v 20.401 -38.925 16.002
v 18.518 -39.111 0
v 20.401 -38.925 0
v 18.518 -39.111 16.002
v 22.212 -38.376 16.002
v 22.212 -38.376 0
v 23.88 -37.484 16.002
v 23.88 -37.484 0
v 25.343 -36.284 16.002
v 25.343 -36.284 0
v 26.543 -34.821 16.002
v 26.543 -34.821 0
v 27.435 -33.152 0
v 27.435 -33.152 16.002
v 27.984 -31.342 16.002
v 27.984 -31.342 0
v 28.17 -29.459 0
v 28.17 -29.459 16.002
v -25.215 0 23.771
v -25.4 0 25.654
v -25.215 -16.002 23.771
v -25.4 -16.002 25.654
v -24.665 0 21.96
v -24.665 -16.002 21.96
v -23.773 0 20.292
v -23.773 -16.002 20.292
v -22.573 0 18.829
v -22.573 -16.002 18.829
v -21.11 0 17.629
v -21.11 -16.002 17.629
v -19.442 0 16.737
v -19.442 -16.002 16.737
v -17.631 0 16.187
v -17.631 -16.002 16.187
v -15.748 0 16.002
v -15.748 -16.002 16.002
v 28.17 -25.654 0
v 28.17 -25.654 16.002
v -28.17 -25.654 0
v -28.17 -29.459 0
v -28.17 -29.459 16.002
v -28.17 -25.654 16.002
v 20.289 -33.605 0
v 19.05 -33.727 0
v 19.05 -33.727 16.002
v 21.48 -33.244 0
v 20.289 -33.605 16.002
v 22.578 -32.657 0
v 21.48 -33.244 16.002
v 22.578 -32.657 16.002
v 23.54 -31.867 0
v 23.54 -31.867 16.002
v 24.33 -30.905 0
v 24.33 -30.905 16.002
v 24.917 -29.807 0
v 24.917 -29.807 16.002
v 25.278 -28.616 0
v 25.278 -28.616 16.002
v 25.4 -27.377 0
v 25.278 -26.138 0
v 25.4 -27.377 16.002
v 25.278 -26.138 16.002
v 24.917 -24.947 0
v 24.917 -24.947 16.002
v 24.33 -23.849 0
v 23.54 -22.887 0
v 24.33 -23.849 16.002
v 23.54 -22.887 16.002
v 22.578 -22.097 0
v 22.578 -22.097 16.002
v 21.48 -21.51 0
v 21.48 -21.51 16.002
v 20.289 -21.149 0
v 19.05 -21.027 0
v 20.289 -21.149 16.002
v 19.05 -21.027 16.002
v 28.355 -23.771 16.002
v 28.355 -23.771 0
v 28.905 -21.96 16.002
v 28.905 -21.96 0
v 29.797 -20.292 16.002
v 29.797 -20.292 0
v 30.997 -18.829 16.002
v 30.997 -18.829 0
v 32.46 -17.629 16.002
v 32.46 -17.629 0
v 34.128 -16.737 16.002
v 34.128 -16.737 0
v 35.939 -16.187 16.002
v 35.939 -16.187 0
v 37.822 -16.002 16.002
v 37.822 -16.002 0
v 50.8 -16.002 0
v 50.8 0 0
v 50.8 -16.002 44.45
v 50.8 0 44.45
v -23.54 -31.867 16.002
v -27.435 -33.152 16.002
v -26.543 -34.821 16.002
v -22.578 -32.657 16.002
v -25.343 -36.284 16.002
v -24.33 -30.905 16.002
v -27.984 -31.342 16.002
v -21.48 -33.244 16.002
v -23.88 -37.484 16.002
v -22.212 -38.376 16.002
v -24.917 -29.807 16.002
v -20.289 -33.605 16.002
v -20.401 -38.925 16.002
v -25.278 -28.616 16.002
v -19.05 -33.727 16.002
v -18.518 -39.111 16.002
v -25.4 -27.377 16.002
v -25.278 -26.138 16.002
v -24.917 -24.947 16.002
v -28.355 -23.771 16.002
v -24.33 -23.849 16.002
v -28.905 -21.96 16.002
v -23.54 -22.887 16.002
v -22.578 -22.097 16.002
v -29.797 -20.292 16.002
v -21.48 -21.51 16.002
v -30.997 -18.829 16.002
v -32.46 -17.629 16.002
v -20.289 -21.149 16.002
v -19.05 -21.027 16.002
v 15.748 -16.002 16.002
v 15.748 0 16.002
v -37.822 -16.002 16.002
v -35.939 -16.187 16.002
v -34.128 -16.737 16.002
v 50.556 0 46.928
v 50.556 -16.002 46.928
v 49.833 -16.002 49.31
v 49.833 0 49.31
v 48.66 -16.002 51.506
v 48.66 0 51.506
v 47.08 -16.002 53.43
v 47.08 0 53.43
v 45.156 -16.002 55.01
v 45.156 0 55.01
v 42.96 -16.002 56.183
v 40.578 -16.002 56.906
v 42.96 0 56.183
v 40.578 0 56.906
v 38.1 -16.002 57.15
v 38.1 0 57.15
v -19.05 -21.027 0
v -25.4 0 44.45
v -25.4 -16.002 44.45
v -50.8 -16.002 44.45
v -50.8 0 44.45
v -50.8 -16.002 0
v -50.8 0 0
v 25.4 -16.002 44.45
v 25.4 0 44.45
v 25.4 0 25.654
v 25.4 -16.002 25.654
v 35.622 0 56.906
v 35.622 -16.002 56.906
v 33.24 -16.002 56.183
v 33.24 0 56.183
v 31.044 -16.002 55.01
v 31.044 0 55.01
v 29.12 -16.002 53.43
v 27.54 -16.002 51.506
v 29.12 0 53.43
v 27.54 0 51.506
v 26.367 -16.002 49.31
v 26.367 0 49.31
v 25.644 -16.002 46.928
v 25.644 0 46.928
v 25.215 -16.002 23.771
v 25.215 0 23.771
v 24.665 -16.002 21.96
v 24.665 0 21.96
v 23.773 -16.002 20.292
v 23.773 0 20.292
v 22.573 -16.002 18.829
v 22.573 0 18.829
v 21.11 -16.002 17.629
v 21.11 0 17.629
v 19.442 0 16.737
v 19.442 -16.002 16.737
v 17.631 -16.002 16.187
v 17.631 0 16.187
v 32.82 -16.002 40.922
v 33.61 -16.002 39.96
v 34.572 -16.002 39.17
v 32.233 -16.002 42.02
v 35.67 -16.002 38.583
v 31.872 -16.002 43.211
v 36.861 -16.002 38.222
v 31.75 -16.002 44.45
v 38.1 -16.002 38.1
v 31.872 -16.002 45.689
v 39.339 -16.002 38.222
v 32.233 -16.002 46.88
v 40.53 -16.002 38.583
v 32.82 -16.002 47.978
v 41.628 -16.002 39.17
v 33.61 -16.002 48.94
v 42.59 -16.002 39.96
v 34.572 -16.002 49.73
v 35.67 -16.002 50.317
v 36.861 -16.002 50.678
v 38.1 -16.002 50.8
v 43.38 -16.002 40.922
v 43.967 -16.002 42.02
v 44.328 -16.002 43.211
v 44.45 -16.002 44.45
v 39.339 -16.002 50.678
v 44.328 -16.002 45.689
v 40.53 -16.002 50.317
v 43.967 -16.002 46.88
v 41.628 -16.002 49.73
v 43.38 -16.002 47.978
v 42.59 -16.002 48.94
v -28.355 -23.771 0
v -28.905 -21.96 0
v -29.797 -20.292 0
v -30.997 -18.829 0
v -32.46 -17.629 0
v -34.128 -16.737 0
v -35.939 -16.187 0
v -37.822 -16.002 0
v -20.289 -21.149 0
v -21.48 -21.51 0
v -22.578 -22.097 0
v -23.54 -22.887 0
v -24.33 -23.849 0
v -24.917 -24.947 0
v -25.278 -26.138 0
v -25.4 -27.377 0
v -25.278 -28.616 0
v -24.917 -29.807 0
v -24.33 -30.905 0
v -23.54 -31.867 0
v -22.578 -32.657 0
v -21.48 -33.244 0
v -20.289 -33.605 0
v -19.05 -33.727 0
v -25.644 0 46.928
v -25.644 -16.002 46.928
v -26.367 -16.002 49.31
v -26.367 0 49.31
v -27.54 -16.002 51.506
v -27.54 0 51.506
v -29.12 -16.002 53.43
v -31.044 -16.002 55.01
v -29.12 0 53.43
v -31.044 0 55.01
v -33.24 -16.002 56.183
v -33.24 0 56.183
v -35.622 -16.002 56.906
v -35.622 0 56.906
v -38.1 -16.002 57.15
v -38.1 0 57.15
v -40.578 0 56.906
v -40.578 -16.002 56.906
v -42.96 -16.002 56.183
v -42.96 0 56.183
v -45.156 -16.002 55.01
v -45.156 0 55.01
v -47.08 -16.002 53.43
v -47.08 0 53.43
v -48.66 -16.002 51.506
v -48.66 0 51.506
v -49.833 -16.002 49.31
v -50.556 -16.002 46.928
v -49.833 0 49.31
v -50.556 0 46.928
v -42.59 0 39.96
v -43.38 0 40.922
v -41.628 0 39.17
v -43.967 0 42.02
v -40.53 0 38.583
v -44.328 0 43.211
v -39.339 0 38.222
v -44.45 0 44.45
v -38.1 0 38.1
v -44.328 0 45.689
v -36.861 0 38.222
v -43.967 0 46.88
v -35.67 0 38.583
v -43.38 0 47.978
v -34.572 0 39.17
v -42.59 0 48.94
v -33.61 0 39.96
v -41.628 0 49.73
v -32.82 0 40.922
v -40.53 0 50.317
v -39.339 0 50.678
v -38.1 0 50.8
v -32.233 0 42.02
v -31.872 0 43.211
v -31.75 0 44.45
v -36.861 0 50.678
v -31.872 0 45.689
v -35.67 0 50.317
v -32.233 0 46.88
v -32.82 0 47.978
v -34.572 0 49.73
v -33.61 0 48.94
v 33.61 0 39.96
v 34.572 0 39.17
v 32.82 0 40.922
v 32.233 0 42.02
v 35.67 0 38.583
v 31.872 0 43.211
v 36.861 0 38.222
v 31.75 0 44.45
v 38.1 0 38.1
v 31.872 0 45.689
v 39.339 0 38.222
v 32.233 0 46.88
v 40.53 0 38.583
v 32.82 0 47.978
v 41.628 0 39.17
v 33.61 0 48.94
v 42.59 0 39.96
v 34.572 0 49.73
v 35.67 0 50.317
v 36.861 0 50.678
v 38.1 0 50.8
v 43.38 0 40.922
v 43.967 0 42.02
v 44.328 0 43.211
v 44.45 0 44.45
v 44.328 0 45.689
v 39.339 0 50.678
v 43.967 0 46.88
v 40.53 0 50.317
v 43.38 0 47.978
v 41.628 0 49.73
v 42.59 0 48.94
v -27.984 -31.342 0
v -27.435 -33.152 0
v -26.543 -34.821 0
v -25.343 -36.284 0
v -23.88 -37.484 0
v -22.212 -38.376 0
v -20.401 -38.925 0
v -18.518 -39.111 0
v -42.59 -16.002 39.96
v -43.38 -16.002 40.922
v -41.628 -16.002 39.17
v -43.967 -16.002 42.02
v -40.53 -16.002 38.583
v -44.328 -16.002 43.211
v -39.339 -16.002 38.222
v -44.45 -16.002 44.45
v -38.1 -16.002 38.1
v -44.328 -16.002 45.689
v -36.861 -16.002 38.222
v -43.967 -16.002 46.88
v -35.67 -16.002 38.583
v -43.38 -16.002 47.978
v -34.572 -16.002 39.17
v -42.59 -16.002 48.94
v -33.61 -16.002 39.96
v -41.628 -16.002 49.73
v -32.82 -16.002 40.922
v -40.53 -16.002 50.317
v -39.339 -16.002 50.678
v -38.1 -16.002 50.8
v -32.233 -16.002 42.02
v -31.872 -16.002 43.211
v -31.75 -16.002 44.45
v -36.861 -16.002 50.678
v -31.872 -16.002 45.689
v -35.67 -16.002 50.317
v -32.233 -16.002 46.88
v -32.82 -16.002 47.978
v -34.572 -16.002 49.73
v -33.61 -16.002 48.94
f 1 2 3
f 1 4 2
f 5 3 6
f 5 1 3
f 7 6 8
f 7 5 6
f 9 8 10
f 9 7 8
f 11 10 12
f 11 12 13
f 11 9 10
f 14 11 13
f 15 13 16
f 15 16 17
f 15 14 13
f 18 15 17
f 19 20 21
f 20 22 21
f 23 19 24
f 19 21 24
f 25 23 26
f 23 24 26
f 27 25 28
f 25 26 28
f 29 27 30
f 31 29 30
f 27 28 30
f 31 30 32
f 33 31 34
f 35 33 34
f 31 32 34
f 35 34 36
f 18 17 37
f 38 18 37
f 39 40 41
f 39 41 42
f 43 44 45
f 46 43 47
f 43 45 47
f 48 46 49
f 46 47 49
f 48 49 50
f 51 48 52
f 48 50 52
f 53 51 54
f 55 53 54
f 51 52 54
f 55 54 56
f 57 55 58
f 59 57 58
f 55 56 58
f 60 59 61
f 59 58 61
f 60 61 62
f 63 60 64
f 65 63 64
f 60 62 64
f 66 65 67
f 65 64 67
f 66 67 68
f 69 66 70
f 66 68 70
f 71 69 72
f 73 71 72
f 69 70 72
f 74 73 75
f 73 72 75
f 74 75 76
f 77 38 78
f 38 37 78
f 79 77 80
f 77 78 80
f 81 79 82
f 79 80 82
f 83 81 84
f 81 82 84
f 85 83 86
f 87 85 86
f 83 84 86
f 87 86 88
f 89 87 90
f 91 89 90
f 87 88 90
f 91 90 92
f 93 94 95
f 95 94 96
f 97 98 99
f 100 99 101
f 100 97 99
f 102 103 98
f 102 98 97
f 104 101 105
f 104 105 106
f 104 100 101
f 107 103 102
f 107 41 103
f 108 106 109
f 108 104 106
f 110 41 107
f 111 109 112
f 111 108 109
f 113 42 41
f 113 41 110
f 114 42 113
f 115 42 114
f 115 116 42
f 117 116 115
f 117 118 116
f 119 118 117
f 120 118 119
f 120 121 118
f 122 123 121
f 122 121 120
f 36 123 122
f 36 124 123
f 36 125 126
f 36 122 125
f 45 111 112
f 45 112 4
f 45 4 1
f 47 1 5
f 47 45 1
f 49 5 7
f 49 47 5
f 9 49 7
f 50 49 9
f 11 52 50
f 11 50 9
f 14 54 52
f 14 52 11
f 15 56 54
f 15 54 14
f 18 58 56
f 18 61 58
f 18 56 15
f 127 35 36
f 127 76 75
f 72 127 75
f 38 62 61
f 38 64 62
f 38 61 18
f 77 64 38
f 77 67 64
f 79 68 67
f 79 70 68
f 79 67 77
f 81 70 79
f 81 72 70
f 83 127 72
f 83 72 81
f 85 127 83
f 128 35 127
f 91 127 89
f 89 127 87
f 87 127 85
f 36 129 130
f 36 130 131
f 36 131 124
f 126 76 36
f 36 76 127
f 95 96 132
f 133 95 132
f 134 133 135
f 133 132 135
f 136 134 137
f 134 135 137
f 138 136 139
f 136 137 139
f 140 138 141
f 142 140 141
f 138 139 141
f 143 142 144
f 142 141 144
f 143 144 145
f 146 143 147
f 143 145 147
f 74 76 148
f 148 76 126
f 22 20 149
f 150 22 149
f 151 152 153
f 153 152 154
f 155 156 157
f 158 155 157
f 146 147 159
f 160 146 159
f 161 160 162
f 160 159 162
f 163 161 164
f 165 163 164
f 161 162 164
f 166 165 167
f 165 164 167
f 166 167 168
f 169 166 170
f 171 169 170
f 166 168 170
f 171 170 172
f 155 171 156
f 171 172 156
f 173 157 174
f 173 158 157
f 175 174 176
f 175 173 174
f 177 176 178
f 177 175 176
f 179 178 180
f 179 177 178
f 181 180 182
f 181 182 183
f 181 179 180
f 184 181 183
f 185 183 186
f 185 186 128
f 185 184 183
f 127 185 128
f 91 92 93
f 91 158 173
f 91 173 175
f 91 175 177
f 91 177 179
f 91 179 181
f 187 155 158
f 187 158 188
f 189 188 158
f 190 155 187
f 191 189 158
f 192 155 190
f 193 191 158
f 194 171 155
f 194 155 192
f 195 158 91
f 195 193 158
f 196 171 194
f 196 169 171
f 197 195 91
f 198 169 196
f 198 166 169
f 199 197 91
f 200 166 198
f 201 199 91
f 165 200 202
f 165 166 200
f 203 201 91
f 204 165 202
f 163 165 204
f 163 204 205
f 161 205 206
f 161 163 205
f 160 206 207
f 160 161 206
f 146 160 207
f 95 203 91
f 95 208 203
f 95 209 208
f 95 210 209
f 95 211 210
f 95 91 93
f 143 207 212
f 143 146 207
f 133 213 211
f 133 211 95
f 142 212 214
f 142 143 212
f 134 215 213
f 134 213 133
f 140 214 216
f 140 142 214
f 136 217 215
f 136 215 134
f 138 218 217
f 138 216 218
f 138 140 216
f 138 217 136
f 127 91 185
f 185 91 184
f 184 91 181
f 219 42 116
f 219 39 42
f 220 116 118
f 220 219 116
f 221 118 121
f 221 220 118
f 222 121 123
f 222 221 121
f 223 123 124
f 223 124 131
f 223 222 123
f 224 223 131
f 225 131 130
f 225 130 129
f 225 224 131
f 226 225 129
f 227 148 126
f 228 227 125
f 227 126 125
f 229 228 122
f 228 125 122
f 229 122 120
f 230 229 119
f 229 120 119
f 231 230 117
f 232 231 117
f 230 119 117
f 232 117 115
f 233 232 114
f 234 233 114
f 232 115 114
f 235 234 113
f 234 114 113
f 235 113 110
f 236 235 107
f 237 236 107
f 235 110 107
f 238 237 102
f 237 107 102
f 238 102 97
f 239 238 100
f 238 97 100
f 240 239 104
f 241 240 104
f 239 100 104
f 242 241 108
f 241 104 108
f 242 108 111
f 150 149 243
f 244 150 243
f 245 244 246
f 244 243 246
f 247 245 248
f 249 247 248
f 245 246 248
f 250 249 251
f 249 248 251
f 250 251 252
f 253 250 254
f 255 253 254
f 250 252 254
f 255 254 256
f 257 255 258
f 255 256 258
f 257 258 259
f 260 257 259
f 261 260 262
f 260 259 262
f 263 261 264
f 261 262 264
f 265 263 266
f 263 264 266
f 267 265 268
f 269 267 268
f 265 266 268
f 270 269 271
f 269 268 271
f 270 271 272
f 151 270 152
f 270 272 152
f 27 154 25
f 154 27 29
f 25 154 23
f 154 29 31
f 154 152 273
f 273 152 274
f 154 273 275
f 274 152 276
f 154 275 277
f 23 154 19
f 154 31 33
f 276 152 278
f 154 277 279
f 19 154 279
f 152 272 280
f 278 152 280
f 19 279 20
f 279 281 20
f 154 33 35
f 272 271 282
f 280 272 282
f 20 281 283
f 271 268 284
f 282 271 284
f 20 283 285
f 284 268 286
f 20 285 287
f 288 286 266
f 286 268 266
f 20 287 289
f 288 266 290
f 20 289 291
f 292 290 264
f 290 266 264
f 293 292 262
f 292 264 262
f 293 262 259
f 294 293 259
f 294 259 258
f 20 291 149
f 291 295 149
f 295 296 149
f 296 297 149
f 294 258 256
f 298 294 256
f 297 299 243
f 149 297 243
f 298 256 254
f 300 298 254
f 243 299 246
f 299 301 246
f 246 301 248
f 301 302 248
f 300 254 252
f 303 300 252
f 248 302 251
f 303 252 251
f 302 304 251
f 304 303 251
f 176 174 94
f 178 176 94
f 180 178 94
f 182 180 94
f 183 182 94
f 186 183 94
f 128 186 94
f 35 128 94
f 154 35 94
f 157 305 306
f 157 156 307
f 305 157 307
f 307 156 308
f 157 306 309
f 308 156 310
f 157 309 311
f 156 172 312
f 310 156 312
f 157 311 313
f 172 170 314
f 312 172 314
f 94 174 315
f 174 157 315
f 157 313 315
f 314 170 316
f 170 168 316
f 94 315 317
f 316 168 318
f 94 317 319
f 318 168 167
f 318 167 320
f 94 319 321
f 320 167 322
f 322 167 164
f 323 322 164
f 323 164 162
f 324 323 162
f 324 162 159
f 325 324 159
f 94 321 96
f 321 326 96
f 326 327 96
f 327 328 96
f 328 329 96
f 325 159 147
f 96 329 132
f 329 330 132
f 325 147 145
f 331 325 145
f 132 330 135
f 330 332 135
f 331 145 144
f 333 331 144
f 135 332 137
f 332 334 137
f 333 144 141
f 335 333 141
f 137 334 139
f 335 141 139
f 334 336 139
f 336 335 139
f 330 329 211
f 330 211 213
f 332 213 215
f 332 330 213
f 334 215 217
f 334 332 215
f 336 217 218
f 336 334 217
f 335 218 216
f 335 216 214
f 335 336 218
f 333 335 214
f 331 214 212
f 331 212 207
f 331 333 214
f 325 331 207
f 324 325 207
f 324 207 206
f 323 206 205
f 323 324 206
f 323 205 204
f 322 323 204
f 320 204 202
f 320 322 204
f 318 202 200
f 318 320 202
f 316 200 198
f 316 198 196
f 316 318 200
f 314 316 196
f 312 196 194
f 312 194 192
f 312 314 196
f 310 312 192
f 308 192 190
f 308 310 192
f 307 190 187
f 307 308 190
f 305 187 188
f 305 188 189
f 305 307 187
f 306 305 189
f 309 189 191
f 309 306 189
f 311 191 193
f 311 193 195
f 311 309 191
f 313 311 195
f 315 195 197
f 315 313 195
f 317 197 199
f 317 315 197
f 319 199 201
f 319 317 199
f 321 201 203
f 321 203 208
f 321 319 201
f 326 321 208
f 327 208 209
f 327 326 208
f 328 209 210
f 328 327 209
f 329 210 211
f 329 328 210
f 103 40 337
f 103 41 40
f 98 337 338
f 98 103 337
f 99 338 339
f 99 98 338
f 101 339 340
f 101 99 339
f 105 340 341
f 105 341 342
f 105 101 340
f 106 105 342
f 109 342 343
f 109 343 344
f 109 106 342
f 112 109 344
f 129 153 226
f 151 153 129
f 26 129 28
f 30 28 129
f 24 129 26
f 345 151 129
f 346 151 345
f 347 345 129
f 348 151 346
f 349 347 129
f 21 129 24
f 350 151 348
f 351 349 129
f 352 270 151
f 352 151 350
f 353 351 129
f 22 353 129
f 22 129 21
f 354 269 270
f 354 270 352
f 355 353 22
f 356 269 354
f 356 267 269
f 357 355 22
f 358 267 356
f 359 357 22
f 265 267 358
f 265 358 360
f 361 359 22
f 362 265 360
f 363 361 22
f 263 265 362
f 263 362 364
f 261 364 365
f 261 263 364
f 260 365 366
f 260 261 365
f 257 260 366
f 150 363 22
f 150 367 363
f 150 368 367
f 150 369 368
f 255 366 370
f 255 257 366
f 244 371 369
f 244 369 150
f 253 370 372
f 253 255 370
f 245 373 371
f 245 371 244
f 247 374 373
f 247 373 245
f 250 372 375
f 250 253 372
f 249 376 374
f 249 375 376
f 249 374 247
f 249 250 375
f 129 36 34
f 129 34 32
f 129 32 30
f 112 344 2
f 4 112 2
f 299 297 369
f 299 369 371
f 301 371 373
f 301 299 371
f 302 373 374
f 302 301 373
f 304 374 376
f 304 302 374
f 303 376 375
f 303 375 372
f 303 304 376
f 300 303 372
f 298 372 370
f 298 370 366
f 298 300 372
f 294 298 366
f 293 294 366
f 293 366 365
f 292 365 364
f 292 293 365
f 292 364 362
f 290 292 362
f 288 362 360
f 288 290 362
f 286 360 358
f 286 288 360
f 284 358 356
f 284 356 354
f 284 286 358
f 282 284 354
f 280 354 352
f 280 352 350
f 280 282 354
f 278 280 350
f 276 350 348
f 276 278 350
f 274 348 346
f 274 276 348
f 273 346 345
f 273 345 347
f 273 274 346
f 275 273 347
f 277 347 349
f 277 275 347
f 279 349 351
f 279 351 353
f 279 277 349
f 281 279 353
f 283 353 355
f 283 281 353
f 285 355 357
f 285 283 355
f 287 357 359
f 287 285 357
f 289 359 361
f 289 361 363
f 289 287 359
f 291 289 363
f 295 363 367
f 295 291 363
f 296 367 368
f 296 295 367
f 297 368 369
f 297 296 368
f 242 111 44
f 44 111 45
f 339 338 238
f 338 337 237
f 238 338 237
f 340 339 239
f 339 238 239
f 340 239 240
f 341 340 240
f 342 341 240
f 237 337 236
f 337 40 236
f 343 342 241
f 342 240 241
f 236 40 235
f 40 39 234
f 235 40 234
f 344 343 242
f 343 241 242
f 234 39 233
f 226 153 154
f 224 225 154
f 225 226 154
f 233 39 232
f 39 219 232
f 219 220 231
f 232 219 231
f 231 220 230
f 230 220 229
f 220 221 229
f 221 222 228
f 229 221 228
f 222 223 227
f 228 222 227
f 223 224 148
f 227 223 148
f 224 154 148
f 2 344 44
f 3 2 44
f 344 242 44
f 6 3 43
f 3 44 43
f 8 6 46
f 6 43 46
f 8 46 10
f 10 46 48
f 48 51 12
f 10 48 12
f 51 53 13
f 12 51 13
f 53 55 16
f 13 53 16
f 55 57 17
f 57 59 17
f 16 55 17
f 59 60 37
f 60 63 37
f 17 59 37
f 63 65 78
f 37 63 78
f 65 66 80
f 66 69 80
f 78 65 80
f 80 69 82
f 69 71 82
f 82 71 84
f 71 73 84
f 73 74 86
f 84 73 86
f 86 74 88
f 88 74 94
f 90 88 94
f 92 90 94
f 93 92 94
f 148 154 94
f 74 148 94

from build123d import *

# Parameters (mm, degrees)
F0_R     = 6.35
F1_DEPTH = 16.002
F2_DEPTH = 16.002
F3_R     = 9.652
F4_W     = 56.33977
F4_H     = 23.11277
F5_DEPTH = 16.002
F7_R     = 9.652
F8_DEPTH = 16.003


with BuildPart() as f1:
    # F0 (on Front) → F1 (new body)
    with BuildSketch(Plane.XZ):
        with BuildLine():
            Line((-50.8, 0), (0, 0))
            Line((0, 0), (50.8, 0))
            Line((50.8, 0), (50.8, 44.45))
            ThreePointArc((50.8, 44.45), (47.080256, 53.430256), (38.1, 57.15))
            ThreePointArc((38.1, 57.15), (29.119744, 53.430256), (25.4, 44.45))
            Line((25.4, 44.45), (25.4, 16.002))
            Line((25.4, 16.002), (0, 16.002))
            Line((0, 16.002), (-25.4, 16.002))
            Line((-25.4, 16.002), (-25.4, 44.45))
            ThreePointArc((-25.4, 44.45), (-29.119744, 53.430256), (-38.1, 57.15))
            ThreePointArc((-38.1, 57.15), (-47.080256, 53.430256), (-50.8, 44.45))
            Line((-50.8, 44.45), (-50.8, 0))
        make_face()
        with Locations((-38.1, 44.45)):
            Circle(F0_R, mode=Mode.SUBTRACT)
        with Locations((38.1, 44.45)):
            Circle(F0_R, mode=Mode.SUBTRACT)
    extrude(amount=F1_DEPTH)

    # F0 (on Front) → F2 (join)
    with BuildSketch(Plane.XZ):
        with BuildLine():
            Line((-50.8, 0), (0, 0))
            Line((0, 0), (50.8, 0))
            Line((50.8, 0), (50.8, 44.45))
            ThreePointArc((50.8, 44.45), (47.080256, 53.430256), (38.1, 57.15))
            ThreePointArc((38.1, 57.15), (29.119744, 53.430256), (25.4, 44.45))
            Line((25.4, 44.45), (25.4, 16.002))
            Line((25.4, 16.002), (0, 16.002))
            Line((0, 16.002), (-25.4, 16.002))
            Line((-25.4, 16.002), (-25.4, 44.45))
            ThreePointArc((-25.4, 44.45), (-29.119744, 53.430256), (-38.1, 57.15))
            ThreePointArc((-38.1, 57.15), (-47.080256, 53.430256), (-50.8, 44.45))
            Line((-50.8, 44.45), (-50.8, 0))
        make_face()
        with Locations((-38.1, 44.45)):
            Circle(F0_R, mode=Mode.SUBTRACT)
        with Locations((38.1, 44.45)):
            Circle(F0_R, mode=Mode.SUBTRACT)
    extrude(amount=F2_DEPTH)

    # F3
    f3_edges = [f1.edges().sort_by_distance(p)[0] for p in [
        (-25.4, -8.001, 16.002),
        (25.4, -8.001, 16.002),
    ]]
    fillet(f3_edges, radius=F3_R)

    # F4 (on Top) → F5 (join)
    with BuildSketch(Plane.XY):
        with Locations((0, -27.554179)):
            Rectangle(F4_W, F4_H)
    extrude(amount=F5_DEPTH)

    # F7
    f7_edges = [f1.edges().sort_by_distance(p)[0] for p in [
        (28.169885, -39.110564, 8.001),
        (-28.169885, -39.110564, 8.001),
        (28.169885, -16.002, 8.001),
        (-28.169885, -16.002, 8.001),
    ]]
    fillet(f7_edges, radius=F7_R)

    # F6 (on face) → F8 (cut, through all)
    with BuildSketch(Plane.XY.offset(16.002)):
        with BuildLine():
            Line((19.05, -21.026887), (0, -21.026887))
            Line((0, -21.026887), (-19.05, -21.026887))
            ThreePointArc((-19.05, -21.026887), (-25.4, -27.376887), (-19.05, -33.726887))
            Line((-19.05, -33.726887), (0, -33.726887))
            Line((0, -33.726887), (19.05, -33.726887))
            ThreePointArc((19.05, -33.726887), (25.4, -27.376887), (19.05, -21.026887))
        make_face()
    extrude(amount=-F8_DEPTH, mode=Mode.SUBTRACT)


solid = f1.part
